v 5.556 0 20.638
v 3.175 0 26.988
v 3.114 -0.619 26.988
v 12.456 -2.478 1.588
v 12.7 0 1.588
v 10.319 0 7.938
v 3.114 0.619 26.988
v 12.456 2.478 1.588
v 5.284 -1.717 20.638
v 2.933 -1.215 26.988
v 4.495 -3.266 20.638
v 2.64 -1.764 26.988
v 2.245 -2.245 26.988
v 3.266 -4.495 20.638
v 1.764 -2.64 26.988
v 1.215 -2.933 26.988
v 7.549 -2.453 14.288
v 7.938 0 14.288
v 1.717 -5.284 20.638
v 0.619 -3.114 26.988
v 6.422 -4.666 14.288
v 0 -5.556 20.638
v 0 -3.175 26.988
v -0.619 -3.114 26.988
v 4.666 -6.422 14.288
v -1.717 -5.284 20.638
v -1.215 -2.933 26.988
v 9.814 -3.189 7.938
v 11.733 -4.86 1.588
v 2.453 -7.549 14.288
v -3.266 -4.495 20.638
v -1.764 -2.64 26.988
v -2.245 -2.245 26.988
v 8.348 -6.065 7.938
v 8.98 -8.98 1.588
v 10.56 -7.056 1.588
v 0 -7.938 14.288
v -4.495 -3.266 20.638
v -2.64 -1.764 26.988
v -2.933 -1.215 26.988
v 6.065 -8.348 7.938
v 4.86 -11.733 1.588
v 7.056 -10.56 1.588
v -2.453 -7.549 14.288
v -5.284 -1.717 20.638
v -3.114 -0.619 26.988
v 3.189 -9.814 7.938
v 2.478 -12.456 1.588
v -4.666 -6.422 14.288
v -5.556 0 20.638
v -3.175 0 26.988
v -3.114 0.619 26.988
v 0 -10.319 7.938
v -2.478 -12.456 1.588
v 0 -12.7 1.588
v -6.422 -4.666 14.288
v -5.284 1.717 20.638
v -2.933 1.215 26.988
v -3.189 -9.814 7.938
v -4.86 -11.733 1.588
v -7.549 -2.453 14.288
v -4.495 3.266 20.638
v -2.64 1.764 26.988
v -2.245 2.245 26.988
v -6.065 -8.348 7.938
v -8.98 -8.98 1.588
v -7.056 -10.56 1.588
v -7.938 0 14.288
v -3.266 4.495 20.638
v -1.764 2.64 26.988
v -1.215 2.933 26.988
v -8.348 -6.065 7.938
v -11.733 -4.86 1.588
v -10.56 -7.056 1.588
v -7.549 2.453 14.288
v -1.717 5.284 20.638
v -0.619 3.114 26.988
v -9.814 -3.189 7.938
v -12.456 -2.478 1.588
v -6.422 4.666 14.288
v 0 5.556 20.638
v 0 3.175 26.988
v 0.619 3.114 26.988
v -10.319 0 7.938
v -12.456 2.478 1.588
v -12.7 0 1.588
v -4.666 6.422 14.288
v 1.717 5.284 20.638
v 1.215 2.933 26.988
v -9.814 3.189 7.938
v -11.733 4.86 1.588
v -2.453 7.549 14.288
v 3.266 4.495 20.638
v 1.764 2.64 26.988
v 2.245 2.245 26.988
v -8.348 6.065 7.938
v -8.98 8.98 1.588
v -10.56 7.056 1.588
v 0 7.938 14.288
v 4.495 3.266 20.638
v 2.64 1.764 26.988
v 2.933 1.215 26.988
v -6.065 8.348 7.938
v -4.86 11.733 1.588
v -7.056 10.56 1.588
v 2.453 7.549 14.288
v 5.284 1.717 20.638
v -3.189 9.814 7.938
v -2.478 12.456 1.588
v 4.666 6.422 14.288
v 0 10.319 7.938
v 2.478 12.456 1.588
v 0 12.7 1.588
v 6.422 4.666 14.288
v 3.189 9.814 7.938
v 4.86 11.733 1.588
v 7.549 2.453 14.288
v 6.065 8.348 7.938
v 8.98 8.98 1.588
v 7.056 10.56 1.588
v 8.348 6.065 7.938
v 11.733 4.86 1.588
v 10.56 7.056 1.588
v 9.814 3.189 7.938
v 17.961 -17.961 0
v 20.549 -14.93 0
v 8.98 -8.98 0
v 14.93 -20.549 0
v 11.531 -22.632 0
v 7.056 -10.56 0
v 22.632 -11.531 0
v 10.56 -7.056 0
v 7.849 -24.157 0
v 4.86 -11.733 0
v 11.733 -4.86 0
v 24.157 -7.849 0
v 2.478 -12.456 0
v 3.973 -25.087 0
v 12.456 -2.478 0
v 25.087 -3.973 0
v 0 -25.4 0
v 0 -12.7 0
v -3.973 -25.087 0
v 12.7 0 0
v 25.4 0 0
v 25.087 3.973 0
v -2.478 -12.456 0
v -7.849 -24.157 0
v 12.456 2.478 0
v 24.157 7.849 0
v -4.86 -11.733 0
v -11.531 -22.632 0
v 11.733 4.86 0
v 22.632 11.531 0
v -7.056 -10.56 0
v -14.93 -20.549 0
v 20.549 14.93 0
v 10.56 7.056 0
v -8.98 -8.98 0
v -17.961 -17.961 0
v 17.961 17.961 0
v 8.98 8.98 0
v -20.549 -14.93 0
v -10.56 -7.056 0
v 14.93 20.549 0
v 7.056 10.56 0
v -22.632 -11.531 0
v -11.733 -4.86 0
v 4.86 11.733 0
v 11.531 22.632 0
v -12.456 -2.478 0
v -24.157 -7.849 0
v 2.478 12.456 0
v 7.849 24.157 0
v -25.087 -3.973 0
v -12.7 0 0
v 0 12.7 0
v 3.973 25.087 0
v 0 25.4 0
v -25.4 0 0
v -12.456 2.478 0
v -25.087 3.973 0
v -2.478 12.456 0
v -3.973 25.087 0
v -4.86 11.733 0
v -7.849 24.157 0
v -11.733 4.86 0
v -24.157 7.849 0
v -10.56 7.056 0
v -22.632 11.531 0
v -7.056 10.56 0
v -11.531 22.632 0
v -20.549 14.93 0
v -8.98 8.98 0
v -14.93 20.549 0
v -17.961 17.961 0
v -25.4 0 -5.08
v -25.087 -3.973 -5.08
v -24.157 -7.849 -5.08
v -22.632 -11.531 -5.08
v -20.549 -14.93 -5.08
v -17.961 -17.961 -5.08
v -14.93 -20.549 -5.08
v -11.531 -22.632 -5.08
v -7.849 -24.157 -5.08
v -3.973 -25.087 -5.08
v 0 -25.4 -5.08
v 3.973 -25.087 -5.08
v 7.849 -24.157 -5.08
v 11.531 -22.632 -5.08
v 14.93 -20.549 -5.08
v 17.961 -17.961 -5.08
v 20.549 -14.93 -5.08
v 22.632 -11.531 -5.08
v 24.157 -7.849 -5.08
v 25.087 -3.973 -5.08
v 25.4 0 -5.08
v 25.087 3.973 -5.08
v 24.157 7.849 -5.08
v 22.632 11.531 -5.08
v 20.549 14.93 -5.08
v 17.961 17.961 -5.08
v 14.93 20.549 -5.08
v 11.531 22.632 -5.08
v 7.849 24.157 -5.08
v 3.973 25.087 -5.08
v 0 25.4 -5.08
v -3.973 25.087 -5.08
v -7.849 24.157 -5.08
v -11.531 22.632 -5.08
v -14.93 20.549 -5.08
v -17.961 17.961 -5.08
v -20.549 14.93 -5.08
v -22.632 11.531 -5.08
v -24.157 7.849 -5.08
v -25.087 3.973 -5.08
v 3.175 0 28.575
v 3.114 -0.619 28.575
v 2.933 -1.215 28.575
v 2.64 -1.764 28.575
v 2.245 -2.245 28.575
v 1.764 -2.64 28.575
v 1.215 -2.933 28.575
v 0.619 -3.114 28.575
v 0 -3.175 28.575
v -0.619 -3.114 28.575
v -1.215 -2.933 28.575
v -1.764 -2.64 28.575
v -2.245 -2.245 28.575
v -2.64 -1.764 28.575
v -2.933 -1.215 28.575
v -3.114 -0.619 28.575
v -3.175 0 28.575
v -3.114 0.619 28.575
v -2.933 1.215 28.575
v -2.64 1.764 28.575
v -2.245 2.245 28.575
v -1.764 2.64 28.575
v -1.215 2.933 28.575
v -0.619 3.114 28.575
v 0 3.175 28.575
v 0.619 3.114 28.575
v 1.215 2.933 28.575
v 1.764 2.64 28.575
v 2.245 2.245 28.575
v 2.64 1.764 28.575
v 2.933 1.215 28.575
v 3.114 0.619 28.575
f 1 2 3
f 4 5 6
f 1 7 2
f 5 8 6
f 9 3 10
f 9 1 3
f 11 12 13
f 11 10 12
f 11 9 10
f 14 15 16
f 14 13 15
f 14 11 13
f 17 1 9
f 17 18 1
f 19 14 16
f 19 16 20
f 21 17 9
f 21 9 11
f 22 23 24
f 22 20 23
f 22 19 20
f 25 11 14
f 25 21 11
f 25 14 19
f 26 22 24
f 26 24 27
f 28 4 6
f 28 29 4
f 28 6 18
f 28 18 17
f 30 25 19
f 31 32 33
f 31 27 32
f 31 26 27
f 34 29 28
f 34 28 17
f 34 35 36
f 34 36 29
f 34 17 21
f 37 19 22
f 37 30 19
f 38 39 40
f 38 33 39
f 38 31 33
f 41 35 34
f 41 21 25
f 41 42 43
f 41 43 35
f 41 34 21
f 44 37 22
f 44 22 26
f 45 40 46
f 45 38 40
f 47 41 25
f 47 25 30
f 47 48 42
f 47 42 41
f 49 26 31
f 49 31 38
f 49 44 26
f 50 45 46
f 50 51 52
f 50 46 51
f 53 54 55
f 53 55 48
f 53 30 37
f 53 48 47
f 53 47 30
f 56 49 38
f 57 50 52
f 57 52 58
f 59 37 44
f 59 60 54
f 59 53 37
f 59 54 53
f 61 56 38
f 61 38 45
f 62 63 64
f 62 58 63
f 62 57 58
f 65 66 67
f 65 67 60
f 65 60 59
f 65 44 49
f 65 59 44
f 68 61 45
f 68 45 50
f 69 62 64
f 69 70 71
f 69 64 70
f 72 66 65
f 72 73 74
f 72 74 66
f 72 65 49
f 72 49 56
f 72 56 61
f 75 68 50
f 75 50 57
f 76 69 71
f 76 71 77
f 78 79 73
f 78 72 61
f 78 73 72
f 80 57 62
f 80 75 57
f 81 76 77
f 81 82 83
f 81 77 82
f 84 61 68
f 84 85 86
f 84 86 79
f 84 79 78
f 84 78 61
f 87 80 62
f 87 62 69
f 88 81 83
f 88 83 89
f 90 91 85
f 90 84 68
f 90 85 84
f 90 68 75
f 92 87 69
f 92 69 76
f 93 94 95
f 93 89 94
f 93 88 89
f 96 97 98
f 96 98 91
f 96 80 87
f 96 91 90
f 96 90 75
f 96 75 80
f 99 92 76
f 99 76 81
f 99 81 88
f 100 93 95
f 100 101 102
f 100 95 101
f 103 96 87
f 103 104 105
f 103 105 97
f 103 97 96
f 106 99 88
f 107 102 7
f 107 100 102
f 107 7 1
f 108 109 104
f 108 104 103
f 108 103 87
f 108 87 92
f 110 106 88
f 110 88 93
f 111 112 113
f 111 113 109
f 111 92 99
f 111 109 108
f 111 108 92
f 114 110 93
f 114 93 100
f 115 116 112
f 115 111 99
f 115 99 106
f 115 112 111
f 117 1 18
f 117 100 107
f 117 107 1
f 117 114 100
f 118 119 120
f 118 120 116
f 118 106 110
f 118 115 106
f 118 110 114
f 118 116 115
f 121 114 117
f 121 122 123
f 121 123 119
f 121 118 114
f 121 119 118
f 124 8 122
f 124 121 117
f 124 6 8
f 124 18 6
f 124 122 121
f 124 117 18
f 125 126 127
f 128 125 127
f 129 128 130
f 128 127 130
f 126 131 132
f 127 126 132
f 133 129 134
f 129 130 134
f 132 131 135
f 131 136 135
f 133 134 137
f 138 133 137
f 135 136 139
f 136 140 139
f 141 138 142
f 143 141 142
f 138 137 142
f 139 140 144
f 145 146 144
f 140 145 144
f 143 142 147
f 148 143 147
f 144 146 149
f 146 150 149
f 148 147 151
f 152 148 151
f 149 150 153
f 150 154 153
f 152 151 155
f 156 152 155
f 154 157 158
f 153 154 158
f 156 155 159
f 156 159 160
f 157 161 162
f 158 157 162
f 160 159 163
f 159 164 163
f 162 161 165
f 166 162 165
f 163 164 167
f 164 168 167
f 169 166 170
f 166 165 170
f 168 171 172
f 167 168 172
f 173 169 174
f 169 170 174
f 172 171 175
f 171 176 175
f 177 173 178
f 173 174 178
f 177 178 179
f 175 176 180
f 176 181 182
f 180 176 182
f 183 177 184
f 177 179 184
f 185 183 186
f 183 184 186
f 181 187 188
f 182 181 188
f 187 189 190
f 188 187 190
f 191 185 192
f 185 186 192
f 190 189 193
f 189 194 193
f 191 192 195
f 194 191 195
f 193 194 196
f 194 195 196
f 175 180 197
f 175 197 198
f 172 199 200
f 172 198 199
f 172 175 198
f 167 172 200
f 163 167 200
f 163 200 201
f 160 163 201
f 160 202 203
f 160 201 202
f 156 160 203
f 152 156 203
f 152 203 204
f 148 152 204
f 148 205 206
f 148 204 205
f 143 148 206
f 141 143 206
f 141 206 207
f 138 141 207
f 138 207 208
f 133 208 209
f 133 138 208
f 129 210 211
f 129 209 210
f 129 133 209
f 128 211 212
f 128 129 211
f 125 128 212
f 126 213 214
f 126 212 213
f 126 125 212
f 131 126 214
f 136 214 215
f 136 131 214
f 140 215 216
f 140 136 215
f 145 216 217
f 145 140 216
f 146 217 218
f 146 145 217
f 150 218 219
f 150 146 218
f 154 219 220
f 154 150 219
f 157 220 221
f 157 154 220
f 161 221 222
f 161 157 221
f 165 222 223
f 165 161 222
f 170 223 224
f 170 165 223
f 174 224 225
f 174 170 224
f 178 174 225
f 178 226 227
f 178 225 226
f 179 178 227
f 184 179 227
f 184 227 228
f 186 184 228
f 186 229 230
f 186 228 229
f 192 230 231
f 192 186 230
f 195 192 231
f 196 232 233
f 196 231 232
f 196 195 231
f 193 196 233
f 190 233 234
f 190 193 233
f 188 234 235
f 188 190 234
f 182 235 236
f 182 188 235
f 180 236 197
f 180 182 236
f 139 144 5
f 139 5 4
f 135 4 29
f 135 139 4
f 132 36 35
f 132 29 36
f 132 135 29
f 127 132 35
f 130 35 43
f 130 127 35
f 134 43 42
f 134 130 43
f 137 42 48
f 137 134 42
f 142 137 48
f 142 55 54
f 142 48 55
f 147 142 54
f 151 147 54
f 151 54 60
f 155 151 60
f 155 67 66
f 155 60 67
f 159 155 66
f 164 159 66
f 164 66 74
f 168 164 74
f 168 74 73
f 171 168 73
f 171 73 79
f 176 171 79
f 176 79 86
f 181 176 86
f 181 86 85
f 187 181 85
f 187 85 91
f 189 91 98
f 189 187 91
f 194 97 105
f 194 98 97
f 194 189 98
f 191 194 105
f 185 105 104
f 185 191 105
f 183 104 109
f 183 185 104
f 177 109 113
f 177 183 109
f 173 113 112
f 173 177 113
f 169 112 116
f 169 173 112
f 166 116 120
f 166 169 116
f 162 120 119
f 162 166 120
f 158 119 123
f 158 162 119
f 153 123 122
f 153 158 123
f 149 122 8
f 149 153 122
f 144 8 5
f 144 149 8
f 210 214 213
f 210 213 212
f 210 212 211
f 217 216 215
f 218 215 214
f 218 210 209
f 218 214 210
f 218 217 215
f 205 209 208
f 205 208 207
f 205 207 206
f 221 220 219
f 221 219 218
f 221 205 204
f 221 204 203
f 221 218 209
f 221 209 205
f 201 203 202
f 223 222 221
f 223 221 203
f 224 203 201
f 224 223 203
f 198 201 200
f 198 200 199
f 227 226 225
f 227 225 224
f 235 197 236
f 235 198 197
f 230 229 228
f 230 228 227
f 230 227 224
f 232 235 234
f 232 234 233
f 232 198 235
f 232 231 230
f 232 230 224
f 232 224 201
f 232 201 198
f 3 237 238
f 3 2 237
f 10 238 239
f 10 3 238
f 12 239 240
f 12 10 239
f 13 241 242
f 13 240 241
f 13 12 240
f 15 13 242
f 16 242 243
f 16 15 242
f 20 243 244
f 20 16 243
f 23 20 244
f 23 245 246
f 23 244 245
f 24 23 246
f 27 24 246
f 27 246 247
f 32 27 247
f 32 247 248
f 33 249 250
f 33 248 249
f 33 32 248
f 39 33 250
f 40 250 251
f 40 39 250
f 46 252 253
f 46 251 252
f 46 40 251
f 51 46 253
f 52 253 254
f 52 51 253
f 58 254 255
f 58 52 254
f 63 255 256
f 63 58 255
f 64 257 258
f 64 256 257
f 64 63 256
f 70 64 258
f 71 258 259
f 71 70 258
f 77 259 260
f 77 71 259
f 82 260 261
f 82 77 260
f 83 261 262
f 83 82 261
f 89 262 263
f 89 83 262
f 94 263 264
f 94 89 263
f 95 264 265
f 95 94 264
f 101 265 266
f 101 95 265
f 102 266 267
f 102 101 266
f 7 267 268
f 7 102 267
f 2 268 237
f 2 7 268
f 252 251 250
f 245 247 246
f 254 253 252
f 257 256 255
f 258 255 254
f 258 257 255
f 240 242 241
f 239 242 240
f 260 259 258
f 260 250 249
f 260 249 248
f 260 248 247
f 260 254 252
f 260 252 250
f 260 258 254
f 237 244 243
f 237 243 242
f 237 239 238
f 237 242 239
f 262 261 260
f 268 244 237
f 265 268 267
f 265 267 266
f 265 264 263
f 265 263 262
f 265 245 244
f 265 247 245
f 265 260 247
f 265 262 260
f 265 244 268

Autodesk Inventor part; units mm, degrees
ref_plane "YZ Plane" through (0, 0, 0) normal (1, 0, 0) x (0, 1, 0)
ref_plane "XZ Plane" through (0, 0, 0) normal (0, 1, 0) x (-1, 0, 0)
ref_plane "XY Plane" through (0, 0, 0) normal (0, 0, 1) x (1, 0, 0)
sketch "Sketch1" plane through (0, 0, 0) normal (0, 0, 1) x (1, 0, 0)
  circle A0 centre (0, 0) radius 12.7
  dimension "d0" = 25.4
extrude "Extrusion1" add sketch "Sketch1" along normal blind 1.5875
ref_plane "Work Plane1" through (0, 0, 26.9875) normal (0, 0, 1) x (1, 0, 0)
sketch "Sketch2" plane through (0, 0, 26.9875) normal (0, 0, 1) x (1, 0, 0)
  circle A0 centre (0, 0) radius 3.175
  dimension "d4" = 6.35
extrude "Extrusion2" add sketch "Sketch2" along normal blind 1.5875
loft "Loft1" add section 1 edges at (-12.7, 0, 1.5875) section 2 edges at (-3.175, 0, 26.9875)
sketch "Sketch3" plane through (0, 0, 0) normal (0, 0, -1) x (-1, 0, 0)
  circle A0 centre (0, 0) radius 25.4
  dimension "d11" = 50.8
extrude "Extrusion3" add sketch "Sketch3" along normal blind 5.08
sketch "Sketch5" plane through (0, 0, -5.08) normal (0, 0, -1) x (-1, 0, 0)
  point P0 (0, 0)
properties part number "Aerospike base"
